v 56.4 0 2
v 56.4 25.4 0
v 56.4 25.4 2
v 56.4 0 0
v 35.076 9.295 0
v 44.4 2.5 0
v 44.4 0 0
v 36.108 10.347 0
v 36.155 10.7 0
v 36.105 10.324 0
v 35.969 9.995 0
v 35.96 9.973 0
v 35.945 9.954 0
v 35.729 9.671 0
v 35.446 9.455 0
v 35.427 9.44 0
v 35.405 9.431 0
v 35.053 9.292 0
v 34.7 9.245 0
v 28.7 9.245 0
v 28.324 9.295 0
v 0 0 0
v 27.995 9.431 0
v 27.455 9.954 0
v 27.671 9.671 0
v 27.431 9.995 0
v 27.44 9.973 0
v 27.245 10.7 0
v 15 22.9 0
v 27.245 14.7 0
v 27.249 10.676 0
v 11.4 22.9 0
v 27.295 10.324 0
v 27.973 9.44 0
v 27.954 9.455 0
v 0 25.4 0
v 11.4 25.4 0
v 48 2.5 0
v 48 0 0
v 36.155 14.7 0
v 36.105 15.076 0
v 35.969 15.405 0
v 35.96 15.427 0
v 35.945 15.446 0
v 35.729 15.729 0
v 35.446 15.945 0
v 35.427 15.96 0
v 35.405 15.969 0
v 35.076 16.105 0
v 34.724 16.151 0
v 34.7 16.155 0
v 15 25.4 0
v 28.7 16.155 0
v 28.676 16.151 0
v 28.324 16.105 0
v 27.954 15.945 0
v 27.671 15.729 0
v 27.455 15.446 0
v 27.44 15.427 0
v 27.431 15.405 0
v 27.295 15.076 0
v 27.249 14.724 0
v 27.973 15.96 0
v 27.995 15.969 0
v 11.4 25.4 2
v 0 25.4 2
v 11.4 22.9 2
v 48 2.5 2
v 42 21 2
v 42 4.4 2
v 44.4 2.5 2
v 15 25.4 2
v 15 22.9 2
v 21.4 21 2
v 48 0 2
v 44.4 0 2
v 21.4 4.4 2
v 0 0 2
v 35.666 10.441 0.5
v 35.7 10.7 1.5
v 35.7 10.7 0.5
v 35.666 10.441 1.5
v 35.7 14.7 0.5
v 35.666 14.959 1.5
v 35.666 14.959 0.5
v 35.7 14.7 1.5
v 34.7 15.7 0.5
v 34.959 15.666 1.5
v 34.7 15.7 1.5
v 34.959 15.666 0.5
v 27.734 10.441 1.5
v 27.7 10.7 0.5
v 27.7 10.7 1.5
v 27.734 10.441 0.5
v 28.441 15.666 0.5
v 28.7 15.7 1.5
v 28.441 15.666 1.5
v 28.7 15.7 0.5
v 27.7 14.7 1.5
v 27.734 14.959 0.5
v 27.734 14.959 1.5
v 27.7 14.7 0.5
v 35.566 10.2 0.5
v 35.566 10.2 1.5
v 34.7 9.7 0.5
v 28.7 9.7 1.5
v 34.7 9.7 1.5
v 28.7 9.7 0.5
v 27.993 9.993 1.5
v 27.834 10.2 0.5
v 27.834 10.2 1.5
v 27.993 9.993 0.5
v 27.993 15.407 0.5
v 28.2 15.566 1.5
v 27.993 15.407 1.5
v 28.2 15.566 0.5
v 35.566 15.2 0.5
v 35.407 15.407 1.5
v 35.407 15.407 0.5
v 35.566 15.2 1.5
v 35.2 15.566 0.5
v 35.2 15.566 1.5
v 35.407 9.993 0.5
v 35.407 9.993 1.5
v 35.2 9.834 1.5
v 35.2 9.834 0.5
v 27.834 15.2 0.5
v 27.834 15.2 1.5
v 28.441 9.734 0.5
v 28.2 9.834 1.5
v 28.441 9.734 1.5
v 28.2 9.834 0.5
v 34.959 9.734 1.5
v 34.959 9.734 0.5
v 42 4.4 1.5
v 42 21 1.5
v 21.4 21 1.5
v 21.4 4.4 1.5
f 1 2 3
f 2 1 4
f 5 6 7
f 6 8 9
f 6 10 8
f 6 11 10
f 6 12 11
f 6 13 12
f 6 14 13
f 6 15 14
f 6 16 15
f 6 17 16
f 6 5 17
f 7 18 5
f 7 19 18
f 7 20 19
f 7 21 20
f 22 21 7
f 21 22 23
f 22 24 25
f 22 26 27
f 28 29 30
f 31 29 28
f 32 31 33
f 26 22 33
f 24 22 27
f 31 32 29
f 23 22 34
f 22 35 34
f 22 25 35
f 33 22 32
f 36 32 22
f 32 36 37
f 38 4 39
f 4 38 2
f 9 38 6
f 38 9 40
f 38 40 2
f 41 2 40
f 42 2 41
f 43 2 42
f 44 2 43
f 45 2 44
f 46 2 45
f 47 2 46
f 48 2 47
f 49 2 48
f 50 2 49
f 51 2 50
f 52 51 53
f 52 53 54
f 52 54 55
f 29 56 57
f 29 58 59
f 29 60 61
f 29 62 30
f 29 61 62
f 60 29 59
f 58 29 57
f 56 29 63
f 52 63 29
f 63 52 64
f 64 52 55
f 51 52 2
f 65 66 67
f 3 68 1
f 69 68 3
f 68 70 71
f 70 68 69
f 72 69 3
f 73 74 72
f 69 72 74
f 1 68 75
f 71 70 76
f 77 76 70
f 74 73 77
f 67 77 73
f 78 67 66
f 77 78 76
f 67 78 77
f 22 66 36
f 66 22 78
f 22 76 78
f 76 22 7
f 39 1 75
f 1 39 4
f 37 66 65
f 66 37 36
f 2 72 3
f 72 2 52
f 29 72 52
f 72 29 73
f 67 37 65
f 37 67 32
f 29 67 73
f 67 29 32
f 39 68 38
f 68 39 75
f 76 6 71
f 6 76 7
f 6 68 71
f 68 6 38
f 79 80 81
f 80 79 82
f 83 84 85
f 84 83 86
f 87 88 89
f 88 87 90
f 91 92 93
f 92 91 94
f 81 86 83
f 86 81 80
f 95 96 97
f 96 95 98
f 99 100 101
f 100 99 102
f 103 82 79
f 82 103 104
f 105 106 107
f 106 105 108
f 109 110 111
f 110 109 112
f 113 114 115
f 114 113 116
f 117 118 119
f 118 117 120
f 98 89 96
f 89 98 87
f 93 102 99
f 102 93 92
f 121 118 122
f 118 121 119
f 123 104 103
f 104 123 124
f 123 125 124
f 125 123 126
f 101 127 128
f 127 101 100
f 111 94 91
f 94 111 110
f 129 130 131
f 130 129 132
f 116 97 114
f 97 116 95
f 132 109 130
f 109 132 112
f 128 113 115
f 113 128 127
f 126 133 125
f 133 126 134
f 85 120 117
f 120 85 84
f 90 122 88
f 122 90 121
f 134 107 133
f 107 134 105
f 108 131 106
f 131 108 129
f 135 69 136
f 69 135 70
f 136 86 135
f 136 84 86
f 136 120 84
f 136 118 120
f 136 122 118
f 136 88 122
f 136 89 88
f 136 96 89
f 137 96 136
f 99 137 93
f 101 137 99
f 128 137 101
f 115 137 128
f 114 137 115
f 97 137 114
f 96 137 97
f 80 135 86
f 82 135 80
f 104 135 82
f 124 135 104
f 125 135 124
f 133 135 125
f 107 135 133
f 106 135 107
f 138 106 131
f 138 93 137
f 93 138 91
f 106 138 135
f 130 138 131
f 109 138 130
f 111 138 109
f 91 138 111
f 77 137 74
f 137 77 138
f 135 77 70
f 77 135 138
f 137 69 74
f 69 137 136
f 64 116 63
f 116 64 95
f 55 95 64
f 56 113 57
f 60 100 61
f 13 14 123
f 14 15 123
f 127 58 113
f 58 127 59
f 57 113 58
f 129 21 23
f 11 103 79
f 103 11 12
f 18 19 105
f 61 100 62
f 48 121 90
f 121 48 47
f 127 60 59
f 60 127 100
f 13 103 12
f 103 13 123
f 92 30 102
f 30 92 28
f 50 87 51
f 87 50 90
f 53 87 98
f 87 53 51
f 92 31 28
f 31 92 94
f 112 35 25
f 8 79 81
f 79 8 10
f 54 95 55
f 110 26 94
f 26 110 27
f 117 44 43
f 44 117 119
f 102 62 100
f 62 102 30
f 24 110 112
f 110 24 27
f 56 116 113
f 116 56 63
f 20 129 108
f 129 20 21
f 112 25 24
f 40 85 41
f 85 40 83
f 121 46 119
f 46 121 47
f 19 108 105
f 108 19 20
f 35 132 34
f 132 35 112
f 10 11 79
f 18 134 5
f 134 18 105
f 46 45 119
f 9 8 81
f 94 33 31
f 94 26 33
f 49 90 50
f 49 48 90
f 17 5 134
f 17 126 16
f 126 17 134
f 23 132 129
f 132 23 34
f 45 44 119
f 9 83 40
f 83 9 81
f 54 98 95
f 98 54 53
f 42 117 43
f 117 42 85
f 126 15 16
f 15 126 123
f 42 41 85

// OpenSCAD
// Concept v0; mm. Regenerate using dimensions.json and build.py.
translate([-0.3, 27.7, 12.0]) {
rotate([180, 0, 0]) {
difference() {
difference() {
difference() {
difference() {
difference() {
translate([0.3, 2.3, 10.0]) {
cube([56.4, 25.4, 2.0]);
}
translate([11.7, 1.7, 9.95]) {
cube([3.6, 3.1, 2.1]);
}
}
translate([44.7, 25.2, 9.95]) {
cube([3.6, 3.1, 2.1]);
}
}
translate([28.0, 12.0, 9.95]) {
hull() {
union() {
union() {
union() {
translate([1, 1, 0]) {
cylinder(h=2.1,r=1,$fn=24);
}
translate([1, 5.0, 0]) {
cylinder(h=2.1,r=1,$fn=24);
}
}
translate([7.0, 1, 0]) {
cylinder(h=2.1,r=1,$fn=24);
}
}
translate([7.0, 5.0, 0]) {
cylinder(h=2.1,r=1,$fn=24);
}
}
}
}
}
translate([21.7, 6.7, 9.95]) {
cube([20.6, 16.6, 0.55]);
}
}
hull() {
union() {
translate([28.0, 12.0, 11.5]) {
hull() {
union() {
union() {
union() {
translate([1, 1, 0]) {
cylinder(h=0.05,r=1,$fn=24);
}
translate([1, 5.0, 0]) {
cylinder(h=0.05,r=1,$fn=24);
}
}
translate([7.0, 1, 0]) {
cylinder(h=0.05,r=1,$fn=24);
}
}
translate([7.0, 5.0, 0]) {
cylinder(h=0.05,r=1,$fn=24);
}
}
}
}
translate([27.5, 11.5, 12.05]) {
hull() {
union() {
union() {
union() {
translate([1.5, 1.5, 0]) {
cylinder(h=0.05,r=1.5,$fn=24);
}
translate([1.5, 5.5, 0]) {
cylinder(h=0.05,r=1.5,$fn=24);
}
}
translate([7.5, 1.5, 0]) {
cylinder(h=0.05,r=1.5,$fn=24);
}
}
translate([7.5, 5.5, 0]) {
cylinder(h=0.05,r=1.5,$fn=24);
}
}
}
}
}
}
}
}
}
